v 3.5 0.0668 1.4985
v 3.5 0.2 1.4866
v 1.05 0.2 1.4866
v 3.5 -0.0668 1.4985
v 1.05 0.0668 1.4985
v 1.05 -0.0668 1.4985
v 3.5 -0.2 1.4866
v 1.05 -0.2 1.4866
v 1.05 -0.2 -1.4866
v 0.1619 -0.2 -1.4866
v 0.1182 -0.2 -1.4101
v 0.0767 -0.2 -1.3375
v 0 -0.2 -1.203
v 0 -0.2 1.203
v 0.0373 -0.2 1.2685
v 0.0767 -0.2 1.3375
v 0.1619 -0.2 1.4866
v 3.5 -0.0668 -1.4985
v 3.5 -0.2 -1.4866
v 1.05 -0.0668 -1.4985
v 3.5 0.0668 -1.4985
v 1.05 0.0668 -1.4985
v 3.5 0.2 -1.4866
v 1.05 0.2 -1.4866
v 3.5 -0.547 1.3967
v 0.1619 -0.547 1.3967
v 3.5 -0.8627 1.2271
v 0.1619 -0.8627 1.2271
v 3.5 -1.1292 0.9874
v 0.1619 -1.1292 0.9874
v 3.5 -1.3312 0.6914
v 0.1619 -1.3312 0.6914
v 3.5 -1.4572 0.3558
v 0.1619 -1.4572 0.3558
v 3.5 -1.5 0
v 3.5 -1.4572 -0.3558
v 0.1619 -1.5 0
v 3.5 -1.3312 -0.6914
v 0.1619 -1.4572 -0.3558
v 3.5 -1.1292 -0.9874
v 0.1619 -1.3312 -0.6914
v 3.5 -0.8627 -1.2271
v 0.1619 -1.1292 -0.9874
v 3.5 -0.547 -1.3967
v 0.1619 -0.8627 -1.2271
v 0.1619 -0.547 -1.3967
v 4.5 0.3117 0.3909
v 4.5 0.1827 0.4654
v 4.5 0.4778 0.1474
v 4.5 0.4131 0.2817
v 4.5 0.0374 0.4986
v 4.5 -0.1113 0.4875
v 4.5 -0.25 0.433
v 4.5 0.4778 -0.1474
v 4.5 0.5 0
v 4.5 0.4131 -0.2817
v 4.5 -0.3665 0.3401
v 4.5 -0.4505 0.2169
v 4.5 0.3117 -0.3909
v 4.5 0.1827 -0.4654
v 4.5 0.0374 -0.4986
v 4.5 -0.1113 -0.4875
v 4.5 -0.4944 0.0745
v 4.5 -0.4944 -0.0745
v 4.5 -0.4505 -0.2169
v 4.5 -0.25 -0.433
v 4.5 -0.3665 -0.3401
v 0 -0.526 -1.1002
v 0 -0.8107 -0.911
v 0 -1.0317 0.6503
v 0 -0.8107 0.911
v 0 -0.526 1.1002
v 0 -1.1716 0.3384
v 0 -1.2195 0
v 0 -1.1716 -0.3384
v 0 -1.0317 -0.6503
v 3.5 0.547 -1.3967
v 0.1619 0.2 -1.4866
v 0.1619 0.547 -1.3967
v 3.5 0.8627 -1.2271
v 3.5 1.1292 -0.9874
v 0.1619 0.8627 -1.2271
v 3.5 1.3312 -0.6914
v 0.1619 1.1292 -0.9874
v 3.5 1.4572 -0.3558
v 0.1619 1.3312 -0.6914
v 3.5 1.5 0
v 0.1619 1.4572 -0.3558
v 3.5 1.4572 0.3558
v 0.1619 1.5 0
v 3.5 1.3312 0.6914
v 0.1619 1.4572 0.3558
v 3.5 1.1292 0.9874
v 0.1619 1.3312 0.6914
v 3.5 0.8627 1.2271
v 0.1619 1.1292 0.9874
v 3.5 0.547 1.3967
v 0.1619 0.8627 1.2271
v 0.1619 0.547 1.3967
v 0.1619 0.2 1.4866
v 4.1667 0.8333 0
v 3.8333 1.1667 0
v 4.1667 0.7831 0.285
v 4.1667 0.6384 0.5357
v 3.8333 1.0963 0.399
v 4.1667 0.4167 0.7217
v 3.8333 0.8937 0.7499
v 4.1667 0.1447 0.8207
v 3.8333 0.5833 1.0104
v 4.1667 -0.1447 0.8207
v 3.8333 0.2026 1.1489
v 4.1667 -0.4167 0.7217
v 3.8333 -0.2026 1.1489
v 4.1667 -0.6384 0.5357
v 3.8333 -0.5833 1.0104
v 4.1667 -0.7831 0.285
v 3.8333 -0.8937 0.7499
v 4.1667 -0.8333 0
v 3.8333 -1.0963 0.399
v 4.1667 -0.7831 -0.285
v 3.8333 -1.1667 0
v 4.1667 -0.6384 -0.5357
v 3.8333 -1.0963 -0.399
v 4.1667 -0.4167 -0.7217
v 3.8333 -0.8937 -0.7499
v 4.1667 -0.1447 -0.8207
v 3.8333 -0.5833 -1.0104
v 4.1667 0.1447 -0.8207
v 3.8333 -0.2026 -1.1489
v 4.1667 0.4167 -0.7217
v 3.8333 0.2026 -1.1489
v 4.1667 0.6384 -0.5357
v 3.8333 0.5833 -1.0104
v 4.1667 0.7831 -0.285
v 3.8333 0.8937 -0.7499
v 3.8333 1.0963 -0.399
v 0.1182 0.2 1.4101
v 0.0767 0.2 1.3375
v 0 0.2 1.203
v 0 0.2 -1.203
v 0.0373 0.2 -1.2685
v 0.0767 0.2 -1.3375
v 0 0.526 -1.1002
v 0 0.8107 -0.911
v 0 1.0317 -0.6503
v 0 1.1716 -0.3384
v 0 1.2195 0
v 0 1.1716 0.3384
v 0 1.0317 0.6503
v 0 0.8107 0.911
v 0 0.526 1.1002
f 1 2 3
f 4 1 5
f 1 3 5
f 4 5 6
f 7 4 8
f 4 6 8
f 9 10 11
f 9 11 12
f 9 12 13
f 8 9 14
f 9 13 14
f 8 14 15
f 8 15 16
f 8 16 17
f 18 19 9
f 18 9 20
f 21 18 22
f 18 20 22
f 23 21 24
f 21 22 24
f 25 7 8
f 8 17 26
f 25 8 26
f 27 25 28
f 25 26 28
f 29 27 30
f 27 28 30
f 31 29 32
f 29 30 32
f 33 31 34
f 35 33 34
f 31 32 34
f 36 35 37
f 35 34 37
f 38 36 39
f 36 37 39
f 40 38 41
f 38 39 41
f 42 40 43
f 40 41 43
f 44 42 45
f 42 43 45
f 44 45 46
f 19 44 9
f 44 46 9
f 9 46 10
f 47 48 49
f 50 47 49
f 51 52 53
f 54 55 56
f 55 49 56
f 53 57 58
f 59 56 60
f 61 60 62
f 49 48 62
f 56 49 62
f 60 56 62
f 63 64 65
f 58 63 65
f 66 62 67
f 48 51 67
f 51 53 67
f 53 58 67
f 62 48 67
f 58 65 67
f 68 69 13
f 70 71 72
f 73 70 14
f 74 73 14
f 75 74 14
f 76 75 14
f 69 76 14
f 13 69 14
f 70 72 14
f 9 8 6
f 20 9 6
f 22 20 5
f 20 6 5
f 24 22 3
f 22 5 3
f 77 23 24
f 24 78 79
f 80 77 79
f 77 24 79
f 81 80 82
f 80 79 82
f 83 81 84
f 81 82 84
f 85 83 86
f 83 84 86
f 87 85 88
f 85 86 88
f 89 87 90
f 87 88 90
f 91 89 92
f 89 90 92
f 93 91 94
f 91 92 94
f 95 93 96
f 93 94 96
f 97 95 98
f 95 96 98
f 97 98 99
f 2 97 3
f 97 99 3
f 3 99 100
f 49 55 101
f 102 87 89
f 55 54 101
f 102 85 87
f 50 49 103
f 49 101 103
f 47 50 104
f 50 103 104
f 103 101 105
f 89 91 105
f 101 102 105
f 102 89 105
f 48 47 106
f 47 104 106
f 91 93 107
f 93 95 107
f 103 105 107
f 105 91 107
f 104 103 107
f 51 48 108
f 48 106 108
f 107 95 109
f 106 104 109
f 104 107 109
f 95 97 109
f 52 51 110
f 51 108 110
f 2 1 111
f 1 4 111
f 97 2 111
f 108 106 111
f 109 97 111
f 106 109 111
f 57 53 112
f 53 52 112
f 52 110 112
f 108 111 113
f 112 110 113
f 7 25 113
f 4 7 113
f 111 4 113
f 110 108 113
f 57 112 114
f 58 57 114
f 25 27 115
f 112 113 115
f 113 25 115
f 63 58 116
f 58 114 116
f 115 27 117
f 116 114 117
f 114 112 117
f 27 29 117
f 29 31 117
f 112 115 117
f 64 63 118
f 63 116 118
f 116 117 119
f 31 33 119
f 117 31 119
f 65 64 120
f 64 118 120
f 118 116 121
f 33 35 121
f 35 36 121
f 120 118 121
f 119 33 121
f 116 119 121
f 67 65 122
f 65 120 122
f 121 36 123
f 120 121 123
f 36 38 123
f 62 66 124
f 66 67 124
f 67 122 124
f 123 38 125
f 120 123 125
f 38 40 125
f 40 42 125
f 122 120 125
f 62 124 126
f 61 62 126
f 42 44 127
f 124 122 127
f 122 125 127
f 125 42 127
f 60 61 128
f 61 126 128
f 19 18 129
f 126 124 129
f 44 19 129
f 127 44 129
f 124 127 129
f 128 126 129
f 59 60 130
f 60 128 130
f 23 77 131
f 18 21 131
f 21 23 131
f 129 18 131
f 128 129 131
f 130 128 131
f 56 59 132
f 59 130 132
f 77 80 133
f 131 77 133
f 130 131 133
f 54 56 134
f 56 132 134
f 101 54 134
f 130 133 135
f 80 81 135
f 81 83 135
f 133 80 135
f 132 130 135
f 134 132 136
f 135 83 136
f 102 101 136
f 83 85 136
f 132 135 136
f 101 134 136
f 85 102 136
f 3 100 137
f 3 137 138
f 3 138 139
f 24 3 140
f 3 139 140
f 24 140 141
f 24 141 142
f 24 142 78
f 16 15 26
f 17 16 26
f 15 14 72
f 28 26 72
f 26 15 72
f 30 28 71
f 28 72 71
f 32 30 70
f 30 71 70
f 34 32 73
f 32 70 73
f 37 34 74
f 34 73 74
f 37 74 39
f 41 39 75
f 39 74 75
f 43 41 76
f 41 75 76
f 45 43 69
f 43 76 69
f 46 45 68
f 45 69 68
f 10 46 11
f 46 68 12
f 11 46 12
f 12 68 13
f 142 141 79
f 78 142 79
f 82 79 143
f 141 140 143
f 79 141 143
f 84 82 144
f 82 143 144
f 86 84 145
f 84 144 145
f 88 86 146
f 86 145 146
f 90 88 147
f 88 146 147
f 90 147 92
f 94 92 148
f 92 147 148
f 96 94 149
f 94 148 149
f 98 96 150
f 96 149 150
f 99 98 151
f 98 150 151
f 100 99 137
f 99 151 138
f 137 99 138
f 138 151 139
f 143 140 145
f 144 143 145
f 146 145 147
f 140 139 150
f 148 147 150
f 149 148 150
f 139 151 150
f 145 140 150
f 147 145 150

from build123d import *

# Parameters (mm, degrees)
BASEBODY_DEPTH               = 5.0000001
BASEBODY_START               = 1.05
BASEBODY_2_DEPTH             = 3.9500001
ENL_V_MAT_EXTRU_1_DEPTH      = 6.431390246
ENL_V_MAT_EXTRU_1_DEPTH_BACK = 6.431390246
ESQUISSE1_W                  = 0.922934363
ESQUISSE1_H                  = 1.901467182


with BuildPart() as part:
    # BaseBody: read off the stored shape, not the designer's step
    # BaseBody outline → BaseBody (new body)
    with BuildSketch(Plane.YZ):
        with BuildLine():
            ThreePointArc((0.2, -1.486606875), (1.5, 0), (0.2, 1.486606875))
            Line((0.2, 1.486606875), (0.2, -1.486606875))
        make_face()
        with BuildLine():
            Line((-0.2, -1.486606875), (-0.2, 1.486606875))
            ThreePointArc((-0.2, 1.486606875), (-1.5, 0), (-0.2, -1.486606875))
        make_face()
    extrude(amount=BASEBODY_DEPTH)

    # BaseBody 2 outline → BaseBody 2 (add)
    with BuildSketch(Plane.YZ.offset(BASEBODY_START)):
        with BuildLine():
            Line((0.2, -1.486606875), (0.2, 1.486606875))
            ThreePointArc((0.2, 1.486606875), (0, 1.5), (-0.2, 1.486606875))
            Line((-0.2, 1.486606875), (-0.2, -1.486606875))
            ThreePointArc((-0.2, -1.486606875), (0, -1.5), (0.2, -1.486606875))
        make_face()
    extrude(amount=BASEBODY_2_DEPTH)

    # BaseBody 3 outline → BaseBody 3 (revolve, cut)
    with BuildSketch(Plane.YX):
        Polygon((1.500000003, 0.161946752), (1.21949999, -6e-09), (1.500000003, -6e-09), align=None)
        Polygon((0, 5), (1.5, 3.5), (1.500000003, 5.0000001), align=None)
    revolve(axis=Axis((0, 0, 0), (1, 0, 0)), mode=Mode.SUBTRACT)

    # Esquisse1 → Enlèv. mat.-Extru.1 (cut, two sides: drawn at the far end of the back side and taken through both)
    with BuildSketch(Plane(origin=(0, 0, 0), x_dir=(1, 0, 0), z_dir=(0, 1, 0)).offset(-ENL_V_MAT_EXTRU_1_DEPTH_BACK)):
        with Locations((4.961467181, -0.061158301)):
            Rectangle(ESQUISSE1_W, ESQUISSE1_H)
    extrude(amount=ENL_V_MAT_EXTRU_1_DEPTH + ENL_V_MAT_EXTRU_1_DEPTH_BACK, mode=Mode.SUBTRACT)


solid = part.part
